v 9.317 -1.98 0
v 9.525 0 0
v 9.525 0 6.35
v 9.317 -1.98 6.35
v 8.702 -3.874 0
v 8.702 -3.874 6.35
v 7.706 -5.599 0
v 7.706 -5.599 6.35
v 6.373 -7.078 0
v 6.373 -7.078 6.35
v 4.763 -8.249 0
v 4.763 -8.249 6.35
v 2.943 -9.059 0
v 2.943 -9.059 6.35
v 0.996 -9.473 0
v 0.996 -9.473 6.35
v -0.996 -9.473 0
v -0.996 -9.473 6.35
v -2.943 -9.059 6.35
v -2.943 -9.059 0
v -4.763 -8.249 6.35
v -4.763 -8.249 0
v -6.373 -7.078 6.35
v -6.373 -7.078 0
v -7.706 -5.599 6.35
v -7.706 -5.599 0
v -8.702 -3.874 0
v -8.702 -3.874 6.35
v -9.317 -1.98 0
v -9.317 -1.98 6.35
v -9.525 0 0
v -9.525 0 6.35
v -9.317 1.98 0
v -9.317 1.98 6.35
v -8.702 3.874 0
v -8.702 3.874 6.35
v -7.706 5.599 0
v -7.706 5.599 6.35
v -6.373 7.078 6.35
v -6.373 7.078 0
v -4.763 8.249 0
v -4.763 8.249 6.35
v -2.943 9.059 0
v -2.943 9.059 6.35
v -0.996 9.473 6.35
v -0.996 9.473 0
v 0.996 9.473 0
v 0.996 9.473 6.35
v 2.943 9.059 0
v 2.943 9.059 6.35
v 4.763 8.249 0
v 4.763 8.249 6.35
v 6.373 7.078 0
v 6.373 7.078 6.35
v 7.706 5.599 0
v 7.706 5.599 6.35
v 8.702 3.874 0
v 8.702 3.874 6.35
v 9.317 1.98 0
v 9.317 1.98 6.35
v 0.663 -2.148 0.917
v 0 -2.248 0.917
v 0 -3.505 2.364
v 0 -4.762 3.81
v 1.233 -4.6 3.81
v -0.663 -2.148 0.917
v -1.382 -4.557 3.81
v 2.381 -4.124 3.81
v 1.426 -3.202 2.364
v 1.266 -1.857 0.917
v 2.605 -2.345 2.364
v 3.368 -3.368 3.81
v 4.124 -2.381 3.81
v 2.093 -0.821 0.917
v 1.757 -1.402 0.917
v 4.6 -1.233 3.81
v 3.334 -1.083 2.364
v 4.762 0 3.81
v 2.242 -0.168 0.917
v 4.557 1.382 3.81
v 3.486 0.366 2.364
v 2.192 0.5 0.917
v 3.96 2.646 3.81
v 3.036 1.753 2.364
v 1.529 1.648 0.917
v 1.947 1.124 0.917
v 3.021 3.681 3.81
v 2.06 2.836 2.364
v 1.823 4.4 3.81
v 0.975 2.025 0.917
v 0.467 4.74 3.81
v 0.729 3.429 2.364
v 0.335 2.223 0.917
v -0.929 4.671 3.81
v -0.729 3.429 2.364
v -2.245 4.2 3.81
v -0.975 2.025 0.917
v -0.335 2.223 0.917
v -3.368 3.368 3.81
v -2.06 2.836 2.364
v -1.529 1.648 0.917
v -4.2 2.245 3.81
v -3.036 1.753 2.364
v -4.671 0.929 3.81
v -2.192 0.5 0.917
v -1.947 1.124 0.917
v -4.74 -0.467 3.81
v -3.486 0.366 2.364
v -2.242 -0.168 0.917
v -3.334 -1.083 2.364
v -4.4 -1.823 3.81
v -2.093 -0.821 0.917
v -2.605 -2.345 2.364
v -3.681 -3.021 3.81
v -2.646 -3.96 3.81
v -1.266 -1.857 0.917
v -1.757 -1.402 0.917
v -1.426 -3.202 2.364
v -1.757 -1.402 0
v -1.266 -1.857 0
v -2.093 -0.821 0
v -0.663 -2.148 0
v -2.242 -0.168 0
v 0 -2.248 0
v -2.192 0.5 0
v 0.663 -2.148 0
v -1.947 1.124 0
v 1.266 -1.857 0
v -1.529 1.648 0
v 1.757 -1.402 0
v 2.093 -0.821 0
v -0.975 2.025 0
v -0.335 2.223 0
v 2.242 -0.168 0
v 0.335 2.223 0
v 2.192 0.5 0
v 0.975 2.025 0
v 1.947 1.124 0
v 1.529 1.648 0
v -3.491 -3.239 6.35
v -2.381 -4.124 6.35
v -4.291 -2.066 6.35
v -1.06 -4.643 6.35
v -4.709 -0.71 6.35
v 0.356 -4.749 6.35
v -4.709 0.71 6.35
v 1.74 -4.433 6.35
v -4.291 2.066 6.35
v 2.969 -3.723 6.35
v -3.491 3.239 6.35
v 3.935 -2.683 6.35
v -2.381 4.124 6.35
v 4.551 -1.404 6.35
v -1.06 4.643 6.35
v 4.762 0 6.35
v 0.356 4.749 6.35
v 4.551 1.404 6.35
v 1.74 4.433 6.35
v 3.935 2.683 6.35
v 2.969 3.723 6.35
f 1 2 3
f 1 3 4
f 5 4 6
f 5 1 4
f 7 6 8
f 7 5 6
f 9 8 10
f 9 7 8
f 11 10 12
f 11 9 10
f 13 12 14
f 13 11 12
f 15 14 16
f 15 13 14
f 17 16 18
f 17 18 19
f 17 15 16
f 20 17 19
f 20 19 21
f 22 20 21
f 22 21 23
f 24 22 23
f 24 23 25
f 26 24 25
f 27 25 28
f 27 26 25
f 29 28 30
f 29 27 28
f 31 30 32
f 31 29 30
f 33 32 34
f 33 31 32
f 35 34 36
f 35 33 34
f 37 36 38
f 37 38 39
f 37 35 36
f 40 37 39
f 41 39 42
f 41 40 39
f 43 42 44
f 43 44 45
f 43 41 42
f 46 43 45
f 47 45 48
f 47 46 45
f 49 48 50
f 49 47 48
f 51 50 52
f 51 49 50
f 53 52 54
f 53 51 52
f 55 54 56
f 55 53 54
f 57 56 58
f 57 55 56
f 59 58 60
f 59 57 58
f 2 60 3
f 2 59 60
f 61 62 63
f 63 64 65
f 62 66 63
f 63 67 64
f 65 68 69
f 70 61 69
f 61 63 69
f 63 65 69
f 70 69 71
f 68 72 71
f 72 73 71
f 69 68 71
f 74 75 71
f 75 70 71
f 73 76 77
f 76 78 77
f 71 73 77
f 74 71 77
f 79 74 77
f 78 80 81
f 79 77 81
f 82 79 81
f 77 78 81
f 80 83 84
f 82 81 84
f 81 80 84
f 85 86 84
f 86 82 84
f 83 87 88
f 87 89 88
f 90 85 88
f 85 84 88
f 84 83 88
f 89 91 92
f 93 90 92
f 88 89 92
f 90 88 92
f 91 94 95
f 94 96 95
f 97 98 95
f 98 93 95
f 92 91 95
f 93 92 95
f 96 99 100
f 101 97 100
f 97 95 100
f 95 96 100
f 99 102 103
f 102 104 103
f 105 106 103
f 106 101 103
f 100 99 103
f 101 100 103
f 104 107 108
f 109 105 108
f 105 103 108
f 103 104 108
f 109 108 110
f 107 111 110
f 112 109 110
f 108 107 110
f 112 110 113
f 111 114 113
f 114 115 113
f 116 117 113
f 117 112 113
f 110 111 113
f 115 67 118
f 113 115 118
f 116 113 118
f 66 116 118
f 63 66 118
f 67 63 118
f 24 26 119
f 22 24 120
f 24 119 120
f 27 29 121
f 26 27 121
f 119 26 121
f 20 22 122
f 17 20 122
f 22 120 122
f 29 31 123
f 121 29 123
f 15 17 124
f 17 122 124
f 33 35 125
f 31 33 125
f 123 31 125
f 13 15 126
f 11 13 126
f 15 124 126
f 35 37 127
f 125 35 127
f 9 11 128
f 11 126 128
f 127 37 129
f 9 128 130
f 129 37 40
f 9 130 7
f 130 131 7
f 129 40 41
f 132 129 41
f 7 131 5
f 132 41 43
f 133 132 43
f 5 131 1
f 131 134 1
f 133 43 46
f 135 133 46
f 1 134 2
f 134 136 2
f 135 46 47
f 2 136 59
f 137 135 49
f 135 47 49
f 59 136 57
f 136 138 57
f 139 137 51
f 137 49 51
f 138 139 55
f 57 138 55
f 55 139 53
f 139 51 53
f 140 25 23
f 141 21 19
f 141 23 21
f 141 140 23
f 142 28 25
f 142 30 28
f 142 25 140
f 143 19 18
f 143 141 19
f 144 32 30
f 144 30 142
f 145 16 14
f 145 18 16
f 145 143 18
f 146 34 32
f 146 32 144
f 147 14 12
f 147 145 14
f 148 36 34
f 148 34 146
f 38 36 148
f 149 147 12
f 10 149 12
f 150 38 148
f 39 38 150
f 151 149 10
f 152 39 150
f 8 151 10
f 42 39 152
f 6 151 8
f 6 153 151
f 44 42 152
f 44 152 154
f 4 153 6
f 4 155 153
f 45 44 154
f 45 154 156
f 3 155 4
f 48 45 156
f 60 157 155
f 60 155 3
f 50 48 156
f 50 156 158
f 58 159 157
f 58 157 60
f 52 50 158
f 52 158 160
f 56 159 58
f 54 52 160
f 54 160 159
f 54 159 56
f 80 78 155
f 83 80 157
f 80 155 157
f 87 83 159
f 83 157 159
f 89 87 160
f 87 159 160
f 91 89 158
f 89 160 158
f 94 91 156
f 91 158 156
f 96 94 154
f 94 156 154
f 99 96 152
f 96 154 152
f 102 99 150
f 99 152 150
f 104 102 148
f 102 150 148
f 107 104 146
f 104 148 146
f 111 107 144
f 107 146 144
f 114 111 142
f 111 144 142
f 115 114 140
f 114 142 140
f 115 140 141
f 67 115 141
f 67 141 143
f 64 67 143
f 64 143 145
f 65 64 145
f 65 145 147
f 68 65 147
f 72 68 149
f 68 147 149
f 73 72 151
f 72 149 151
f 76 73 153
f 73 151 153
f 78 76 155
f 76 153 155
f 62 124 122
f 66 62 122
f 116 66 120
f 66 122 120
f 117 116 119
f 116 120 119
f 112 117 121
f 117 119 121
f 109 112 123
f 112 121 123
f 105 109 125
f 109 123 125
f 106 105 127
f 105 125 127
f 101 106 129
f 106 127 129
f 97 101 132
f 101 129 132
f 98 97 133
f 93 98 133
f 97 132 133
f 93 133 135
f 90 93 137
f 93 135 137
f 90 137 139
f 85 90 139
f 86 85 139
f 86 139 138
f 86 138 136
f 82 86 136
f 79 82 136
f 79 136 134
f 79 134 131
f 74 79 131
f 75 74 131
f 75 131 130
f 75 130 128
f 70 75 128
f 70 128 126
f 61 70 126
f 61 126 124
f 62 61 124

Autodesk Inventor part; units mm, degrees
ref_plane "YZ Plane" through (0, 0, 0) normal (1, 0, 0) x (0, 1, 0)
ref_plane "XZ Plane" through (0, 0, 0) normal (0, 1, 0) x (-1, 0, 0)
ref_plane "XY Plane" through (0, 0, 0) normal (0, 0, 1) x (1, 0, 0)
sketch "Sketch1" plane through (0, 0, 0) normal (0, 0, 1) x (1, 0, 0)
  line L0 (0, 13.335) -> (0, -13.335) projected
  line L1 (-13.335, 0) -> (13.335, 0) projected
  circle A0 centre (0, 0) radius 9.525
  dimension "d0" = 19.05
extrude "Extrusion1" add sketch "Sketch1" along normal blind 6.35
sketch "Sketch2" plane through (0, 0, 6.35) normal (0, 0, 1) x (1, 0, 0)
  circle A0 centre (0, 0) radius 9.525 projected
  circle A1 centre (0, 0) radius 4.7625
  dimension "d3" = 9.525
extrude "Extrusion2" cut sketch "Sketch2" against normal blind 2.54 contours A1
hole "Hole1" at (0, 0, 3.81) direction (0, 0, -1) diameter 4.4958 end through all countersink diameter 9.525 countersink angle 82 clearance for "Flat Head Machine Screw (82)" size "#8" standard "Ansi Unified Screw Threads"
